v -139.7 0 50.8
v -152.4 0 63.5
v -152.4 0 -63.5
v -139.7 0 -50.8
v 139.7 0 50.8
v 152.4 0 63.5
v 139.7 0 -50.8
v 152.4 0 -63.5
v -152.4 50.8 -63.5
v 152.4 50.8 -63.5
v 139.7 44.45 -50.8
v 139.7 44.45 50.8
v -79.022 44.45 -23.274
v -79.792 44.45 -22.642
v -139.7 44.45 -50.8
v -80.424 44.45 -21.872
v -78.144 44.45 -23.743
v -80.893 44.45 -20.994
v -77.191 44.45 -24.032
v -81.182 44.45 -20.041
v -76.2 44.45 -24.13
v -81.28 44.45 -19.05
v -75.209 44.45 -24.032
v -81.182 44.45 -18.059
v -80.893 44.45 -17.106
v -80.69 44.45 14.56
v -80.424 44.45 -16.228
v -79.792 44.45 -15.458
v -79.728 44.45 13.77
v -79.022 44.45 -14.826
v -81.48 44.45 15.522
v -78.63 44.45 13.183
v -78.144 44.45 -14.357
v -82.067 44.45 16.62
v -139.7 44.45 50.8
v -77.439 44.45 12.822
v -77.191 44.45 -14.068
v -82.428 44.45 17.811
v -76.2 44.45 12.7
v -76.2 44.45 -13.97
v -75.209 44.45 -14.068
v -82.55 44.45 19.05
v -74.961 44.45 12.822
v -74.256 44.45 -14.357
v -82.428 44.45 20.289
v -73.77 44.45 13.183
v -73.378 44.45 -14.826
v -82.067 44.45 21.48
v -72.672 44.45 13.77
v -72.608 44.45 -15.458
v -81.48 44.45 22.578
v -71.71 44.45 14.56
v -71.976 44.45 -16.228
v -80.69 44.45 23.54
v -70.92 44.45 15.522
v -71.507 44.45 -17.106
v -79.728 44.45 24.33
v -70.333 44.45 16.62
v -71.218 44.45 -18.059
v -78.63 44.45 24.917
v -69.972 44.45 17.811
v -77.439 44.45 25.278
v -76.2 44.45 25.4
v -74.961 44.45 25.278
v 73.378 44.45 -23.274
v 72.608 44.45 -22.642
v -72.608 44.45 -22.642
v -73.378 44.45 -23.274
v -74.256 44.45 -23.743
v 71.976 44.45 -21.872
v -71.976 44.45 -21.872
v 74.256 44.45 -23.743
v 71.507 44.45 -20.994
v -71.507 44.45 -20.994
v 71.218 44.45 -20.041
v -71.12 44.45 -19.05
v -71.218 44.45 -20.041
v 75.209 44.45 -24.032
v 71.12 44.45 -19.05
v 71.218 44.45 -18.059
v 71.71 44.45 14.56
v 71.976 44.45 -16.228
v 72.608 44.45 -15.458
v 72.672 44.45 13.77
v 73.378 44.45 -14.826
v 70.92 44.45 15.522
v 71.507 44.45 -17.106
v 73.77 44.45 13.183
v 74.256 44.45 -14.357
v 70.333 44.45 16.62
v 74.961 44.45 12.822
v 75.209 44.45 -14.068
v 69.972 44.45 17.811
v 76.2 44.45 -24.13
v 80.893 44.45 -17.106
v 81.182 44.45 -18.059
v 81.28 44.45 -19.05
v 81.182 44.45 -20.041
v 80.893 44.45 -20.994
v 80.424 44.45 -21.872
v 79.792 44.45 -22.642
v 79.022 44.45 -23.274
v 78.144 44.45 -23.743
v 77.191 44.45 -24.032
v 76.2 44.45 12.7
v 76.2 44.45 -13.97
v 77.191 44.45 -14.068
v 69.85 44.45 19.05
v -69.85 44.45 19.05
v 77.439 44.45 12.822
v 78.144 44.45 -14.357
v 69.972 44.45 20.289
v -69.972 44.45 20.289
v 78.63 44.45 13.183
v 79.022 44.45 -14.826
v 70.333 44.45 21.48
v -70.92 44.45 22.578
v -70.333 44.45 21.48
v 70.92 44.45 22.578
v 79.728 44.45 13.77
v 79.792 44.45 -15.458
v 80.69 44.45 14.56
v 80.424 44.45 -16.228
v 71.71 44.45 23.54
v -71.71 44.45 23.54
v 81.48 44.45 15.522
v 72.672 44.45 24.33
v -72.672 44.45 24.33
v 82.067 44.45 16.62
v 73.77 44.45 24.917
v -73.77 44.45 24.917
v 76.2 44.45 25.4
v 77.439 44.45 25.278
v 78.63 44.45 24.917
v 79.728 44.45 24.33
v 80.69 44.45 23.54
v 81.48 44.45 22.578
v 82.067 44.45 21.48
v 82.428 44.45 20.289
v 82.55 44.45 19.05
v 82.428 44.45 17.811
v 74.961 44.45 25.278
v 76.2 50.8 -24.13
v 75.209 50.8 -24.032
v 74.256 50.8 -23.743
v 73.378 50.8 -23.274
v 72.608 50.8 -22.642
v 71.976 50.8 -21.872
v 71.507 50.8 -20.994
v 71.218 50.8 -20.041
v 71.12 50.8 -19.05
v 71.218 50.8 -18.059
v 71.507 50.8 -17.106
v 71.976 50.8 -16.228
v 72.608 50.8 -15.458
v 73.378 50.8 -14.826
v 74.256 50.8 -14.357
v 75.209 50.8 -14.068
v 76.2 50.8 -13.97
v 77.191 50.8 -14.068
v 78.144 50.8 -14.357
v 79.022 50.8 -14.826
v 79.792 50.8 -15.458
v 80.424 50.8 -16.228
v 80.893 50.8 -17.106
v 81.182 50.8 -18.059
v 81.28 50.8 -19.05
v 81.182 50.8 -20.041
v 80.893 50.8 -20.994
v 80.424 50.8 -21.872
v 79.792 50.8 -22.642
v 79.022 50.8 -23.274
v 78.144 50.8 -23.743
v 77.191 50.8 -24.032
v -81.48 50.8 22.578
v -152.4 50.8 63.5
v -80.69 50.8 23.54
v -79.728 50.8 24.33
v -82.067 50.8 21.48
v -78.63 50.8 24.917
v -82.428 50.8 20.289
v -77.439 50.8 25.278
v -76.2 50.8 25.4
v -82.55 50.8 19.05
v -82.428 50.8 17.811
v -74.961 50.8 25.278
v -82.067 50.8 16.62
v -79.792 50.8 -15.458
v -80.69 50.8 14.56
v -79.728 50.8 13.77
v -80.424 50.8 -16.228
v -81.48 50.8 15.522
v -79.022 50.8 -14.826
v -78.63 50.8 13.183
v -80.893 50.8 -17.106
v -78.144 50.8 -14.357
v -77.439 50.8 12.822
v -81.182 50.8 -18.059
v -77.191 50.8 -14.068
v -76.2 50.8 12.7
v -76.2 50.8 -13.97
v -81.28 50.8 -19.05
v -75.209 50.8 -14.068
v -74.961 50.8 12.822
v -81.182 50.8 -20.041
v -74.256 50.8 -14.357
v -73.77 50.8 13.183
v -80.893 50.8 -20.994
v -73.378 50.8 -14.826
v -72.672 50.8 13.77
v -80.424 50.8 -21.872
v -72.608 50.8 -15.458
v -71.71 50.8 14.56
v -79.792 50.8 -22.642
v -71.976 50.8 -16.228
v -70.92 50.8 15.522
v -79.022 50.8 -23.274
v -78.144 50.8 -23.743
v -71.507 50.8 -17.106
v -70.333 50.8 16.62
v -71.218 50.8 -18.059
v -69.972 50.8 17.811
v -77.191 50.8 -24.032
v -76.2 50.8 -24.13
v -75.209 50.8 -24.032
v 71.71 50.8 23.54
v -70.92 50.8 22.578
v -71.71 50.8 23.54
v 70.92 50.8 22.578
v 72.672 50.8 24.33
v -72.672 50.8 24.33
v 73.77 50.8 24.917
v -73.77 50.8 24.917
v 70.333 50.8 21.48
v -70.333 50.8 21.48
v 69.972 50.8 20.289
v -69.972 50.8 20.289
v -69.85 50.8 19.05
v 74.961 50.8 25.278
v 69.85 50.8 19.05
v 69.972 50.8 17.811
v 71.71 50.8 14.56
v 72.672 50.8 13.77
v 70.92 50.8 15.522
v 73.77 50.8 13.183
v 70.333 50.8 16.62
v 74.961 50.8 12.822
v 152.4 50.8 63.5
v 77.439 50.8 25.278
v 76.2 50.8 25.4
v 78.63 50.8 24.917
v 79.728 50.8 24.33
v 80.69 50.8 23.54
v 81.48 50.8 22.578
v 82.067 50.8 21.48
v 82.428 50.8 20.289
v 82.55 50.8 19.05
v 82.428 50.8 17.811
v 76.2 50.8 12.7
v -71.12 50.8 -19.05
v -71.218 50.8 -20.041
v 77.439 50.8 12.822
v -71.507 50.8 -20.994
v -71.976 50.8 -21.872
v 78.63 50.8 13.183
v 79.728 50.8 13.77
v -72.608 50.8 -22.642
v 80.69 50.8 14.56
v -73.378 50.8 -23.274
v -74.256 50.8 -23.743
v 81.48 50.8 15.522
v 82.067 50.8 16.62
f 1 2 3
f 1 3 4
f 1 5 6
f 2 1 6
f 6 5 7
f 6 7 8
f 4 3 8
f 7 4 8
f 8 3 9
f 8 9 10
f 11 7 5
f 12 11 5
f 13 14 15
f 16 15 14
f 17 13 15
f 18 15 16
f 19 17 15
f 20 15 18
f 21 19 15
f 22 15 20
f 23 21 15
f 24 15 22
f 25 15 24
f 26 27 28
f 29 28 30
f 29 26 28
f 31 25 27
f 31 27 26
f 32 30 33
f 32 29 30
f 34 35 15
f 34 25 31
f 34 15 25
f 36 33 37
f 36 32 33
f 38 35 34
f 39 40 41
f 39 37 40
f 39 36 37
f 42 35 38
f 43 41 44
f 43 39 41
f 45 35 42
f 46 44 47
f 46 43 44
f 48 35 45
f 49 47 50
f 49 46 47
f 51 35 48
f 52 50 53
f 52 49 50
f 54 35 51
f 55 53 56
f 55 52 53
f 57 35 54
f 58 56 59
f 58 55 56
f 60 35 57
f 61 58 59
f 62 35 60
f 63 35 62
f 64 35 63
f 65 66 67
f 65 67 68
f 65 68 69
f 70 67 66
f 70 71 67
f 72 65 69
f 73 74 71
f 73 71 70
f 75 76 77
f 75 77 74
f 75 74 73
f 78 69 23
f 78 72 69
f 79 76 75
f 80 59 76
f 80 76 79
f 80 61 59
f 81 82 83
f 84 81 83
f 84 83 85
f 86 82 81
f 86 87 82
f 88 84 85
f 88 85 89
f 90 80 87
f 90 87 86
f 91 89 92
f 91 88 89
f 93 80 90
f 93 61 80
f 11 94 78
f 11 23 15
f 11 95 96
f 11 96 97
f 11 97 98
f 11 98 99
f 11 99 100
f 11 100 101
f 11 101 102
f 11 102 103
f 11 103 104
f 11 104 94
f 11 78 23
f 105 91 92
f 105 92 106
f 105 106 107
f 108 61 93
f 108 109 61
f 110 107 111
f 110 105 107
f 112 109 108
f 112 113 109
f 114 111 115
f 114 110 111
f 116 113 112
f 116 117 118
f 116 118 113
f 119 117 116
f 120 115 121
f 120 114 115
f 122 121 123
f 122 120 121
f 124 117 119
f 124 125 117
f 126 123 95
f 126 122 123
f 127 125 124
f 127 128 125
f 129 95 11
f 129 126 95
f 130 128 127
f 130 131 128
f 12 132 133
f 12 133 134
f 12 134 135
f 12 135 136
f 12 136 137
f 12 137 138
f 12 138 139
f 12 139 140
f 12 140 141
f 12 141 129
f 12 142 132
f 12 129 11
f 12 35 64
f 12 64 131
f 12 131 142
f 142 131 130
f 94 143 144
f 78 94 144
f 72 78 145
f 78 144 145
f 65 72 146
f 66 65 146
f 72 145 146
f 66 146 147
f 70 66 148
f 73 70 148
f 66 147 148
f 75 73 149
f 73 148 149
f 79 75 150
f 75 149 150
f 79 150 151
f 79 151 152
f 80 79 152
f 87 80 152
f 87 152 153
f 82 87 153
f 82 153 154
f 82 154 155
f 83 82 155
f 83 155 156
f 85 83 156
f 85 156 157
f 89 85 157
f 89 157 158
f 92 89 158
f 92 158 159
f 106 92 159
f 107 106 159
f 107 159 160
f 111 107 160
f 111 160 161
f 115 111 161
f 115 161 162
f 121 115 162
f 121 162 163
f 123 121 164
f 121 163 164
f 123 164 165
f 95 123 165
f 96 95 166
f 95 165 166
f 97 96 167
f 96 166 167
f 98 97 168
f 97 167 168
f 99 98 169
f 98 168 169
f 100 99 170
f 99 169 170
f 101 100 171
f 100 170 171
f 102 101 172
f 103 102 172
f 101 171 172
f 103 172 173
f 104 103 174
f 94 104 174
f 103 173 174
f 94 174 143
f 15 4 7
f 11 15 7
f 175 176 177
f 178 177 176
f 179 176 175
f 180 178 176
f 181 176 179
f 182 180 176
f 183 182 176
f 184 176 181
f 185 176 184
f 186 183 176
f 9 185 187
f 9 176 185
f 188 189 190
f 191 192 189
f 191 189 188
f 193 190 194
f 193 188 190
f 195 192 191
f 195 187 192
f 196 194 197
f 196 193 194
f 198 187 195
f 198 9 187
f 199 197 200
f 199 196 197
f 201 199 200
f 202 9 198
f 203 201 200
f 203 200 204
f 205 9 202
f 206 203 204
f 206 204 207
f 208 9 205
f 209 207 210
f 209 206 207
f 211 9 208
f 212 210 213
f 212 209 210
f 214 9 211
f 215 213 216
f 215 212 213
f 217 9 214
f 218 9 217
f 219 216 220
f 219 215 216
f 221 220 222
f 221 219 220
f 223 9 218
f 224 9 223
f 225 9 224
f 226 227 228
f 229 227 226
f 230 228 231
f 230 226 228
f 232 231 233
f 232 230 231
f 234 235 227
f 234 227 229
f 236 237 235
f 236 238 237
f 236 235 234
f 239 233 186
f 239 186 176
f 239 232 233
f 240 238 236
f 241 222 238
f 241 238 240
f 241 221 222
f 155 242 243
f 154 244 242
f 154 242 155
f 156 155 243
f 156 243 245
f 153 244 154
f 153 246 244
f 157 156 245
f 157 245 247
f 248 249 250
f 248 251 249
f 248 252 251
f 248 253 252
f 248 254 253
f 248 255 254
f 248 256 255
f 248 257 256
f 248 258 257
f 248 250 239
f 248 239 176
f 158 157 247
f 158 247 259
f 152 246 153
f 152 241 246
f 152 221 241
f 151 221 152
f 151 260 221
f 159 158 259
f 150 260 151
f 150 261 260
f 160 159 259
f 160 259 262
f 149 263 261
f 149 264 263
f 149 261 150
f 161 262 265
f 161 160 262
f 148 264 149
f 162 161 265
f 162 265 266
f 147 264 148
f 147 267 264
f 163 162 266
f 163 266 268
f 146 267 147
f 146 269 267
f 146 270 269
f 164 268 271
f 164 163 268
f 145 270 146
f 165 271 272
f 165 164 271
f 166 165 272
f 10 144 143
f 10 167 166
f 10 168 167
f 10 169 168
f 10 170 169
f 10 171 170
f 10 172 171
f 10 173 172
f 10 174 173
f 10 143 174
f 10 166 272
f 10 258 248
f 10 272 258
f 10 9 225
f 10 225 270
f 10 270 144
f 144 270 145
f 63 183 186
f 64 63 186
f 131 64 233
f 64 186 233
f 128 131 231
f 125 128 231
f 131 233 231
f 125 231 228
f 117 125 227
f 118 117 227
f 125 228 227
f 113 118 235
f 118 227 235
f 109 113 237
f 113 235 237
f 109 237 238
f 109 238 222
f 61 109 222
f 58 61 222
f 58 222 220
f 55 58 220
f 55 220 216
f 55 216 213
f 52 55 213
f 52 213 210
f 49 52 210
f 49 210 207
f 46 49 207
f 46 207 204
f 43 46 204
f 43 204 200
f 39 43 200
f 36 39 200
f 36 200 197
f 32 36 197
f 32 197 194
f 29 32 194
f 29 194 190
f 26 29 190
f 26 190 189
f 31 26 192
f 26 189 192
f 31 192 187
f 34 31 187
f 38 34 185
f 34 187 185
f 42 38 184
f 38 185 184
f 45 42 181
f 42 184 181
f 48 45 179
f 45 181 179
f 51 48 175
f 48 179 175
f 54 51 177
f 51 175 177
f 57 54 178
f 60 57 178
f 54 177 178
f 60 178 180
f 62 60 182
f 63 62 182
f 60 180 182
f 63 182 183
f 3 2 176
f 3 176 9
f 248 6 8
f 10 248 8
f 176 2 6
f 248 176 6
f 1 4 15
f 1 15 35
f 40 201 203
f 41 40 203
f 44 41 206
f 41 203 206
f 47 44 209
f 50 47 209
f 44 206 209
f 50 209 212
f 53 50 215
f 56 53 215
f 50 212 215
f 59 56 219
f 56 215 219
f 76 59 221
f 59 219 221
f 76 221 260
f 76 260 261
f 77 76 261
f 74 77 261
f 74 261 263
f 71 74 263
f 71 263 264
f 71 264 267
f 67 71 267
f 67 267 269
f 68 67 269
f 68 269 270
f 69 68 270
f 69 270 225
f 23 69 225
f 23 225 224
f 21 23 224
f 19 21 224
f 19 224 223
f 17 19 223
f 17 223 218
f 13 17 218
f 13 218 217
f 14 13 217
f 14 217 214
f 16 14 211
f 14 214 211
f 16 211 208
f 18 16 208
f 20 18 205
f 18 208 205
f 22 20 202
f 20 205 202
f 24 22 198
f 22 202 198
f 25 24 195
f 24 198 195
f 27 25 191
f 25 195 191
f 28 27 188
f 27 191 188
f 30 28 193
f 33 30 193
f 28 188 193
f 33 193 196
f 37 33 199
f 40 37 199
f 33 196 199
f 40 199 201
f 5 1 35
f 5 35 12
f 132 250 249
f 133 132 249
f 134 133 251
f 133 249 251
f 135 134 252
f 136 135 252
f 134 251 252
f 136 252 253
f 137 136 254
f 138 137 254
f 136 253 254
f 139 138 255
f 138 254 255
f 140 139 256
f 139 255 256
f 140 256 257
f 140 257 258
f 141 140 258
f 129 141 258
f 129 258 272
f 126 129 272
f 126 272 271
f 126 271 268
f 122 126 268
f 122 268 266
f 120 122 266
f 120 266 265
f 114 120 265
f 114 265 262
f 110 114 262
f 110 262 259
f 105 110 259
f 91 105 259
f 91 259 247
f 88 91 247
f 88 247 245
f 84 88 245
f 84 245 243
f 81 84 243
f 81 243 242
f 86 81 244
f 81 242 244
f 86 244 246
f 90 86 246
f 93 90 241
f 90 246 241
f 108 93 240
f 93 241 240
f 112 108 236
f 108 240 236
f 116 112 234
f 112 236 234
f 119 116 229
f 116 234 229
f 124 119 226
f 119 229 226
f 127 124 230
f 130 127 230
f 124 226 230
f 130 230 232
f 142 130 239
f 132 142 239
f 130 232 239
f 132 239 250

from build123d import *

# Parameters (mm, degrees)
SKETCH1_W           = 304.8
SKETCH1_H           = 127
BOSS_EXTRUDE1_DEPTH = 50.8
SKETCH2_W           = 279.4
SKETCH2_H           = 101.6
CUT_EXTRUDE1_DEPTH  = 44.45
SKETCH3_R           = 5.08
SKETCH3_R_2         = 6.35
CUT_EXTRUDE2_DEPTH  = 12.7


with BuildPart() as part:
    # Sketch1 → Boss-Extrude1 (new body)
    with BuildSketch(Plane(origin=(0, 0, 0), x_dir=(1, 0, 0), z_dir=(0, 1, 0))):
        Rectangle(SKETCH1_W, SKETCH1_H)
    extrude(amount=BOSS_EXTRUDE1_DEPTH)

    # Sketch2 → Cut-Extrude1 (cut)
    with BuildSketch(Plane.XZ):
        Rectangle(SKETCH2_W, SKETCH2_H)
    extrude(amount=-CUT_EXTRUDE1_DEPTH, mode=Mode.SUBTRACT)

    # Sketch3 → Cut-Extrude2 (cut)
    with BuildSketch(Plane(origin=(0, 50.8, 0), x_dir=(1, 0, 0), z_dir=(0, 1, 0))):
        with Locations(Location((-76.2, 19.05, 0), (0, 0, 270))):
            Circle(SKETCH3_R)
        with Locations(Location((76.2, 19.05, 0), (0, 0, 90))):
            Circle(SKETCH3_R)
        with Locations(Location((-76.2, -19.05, 0), (0, 0, 270))):
            Circle(SKETCH3_R_2)
        with Locations(Location((76.2, -19.05, 0), (0, 0, 270))):
            Circle(SKETCH3_R_2)
    extrude(amount=-CUT_EXTRUDE2_DEPTH, mode=Mode.SUBTRACT)


solid = part.part
